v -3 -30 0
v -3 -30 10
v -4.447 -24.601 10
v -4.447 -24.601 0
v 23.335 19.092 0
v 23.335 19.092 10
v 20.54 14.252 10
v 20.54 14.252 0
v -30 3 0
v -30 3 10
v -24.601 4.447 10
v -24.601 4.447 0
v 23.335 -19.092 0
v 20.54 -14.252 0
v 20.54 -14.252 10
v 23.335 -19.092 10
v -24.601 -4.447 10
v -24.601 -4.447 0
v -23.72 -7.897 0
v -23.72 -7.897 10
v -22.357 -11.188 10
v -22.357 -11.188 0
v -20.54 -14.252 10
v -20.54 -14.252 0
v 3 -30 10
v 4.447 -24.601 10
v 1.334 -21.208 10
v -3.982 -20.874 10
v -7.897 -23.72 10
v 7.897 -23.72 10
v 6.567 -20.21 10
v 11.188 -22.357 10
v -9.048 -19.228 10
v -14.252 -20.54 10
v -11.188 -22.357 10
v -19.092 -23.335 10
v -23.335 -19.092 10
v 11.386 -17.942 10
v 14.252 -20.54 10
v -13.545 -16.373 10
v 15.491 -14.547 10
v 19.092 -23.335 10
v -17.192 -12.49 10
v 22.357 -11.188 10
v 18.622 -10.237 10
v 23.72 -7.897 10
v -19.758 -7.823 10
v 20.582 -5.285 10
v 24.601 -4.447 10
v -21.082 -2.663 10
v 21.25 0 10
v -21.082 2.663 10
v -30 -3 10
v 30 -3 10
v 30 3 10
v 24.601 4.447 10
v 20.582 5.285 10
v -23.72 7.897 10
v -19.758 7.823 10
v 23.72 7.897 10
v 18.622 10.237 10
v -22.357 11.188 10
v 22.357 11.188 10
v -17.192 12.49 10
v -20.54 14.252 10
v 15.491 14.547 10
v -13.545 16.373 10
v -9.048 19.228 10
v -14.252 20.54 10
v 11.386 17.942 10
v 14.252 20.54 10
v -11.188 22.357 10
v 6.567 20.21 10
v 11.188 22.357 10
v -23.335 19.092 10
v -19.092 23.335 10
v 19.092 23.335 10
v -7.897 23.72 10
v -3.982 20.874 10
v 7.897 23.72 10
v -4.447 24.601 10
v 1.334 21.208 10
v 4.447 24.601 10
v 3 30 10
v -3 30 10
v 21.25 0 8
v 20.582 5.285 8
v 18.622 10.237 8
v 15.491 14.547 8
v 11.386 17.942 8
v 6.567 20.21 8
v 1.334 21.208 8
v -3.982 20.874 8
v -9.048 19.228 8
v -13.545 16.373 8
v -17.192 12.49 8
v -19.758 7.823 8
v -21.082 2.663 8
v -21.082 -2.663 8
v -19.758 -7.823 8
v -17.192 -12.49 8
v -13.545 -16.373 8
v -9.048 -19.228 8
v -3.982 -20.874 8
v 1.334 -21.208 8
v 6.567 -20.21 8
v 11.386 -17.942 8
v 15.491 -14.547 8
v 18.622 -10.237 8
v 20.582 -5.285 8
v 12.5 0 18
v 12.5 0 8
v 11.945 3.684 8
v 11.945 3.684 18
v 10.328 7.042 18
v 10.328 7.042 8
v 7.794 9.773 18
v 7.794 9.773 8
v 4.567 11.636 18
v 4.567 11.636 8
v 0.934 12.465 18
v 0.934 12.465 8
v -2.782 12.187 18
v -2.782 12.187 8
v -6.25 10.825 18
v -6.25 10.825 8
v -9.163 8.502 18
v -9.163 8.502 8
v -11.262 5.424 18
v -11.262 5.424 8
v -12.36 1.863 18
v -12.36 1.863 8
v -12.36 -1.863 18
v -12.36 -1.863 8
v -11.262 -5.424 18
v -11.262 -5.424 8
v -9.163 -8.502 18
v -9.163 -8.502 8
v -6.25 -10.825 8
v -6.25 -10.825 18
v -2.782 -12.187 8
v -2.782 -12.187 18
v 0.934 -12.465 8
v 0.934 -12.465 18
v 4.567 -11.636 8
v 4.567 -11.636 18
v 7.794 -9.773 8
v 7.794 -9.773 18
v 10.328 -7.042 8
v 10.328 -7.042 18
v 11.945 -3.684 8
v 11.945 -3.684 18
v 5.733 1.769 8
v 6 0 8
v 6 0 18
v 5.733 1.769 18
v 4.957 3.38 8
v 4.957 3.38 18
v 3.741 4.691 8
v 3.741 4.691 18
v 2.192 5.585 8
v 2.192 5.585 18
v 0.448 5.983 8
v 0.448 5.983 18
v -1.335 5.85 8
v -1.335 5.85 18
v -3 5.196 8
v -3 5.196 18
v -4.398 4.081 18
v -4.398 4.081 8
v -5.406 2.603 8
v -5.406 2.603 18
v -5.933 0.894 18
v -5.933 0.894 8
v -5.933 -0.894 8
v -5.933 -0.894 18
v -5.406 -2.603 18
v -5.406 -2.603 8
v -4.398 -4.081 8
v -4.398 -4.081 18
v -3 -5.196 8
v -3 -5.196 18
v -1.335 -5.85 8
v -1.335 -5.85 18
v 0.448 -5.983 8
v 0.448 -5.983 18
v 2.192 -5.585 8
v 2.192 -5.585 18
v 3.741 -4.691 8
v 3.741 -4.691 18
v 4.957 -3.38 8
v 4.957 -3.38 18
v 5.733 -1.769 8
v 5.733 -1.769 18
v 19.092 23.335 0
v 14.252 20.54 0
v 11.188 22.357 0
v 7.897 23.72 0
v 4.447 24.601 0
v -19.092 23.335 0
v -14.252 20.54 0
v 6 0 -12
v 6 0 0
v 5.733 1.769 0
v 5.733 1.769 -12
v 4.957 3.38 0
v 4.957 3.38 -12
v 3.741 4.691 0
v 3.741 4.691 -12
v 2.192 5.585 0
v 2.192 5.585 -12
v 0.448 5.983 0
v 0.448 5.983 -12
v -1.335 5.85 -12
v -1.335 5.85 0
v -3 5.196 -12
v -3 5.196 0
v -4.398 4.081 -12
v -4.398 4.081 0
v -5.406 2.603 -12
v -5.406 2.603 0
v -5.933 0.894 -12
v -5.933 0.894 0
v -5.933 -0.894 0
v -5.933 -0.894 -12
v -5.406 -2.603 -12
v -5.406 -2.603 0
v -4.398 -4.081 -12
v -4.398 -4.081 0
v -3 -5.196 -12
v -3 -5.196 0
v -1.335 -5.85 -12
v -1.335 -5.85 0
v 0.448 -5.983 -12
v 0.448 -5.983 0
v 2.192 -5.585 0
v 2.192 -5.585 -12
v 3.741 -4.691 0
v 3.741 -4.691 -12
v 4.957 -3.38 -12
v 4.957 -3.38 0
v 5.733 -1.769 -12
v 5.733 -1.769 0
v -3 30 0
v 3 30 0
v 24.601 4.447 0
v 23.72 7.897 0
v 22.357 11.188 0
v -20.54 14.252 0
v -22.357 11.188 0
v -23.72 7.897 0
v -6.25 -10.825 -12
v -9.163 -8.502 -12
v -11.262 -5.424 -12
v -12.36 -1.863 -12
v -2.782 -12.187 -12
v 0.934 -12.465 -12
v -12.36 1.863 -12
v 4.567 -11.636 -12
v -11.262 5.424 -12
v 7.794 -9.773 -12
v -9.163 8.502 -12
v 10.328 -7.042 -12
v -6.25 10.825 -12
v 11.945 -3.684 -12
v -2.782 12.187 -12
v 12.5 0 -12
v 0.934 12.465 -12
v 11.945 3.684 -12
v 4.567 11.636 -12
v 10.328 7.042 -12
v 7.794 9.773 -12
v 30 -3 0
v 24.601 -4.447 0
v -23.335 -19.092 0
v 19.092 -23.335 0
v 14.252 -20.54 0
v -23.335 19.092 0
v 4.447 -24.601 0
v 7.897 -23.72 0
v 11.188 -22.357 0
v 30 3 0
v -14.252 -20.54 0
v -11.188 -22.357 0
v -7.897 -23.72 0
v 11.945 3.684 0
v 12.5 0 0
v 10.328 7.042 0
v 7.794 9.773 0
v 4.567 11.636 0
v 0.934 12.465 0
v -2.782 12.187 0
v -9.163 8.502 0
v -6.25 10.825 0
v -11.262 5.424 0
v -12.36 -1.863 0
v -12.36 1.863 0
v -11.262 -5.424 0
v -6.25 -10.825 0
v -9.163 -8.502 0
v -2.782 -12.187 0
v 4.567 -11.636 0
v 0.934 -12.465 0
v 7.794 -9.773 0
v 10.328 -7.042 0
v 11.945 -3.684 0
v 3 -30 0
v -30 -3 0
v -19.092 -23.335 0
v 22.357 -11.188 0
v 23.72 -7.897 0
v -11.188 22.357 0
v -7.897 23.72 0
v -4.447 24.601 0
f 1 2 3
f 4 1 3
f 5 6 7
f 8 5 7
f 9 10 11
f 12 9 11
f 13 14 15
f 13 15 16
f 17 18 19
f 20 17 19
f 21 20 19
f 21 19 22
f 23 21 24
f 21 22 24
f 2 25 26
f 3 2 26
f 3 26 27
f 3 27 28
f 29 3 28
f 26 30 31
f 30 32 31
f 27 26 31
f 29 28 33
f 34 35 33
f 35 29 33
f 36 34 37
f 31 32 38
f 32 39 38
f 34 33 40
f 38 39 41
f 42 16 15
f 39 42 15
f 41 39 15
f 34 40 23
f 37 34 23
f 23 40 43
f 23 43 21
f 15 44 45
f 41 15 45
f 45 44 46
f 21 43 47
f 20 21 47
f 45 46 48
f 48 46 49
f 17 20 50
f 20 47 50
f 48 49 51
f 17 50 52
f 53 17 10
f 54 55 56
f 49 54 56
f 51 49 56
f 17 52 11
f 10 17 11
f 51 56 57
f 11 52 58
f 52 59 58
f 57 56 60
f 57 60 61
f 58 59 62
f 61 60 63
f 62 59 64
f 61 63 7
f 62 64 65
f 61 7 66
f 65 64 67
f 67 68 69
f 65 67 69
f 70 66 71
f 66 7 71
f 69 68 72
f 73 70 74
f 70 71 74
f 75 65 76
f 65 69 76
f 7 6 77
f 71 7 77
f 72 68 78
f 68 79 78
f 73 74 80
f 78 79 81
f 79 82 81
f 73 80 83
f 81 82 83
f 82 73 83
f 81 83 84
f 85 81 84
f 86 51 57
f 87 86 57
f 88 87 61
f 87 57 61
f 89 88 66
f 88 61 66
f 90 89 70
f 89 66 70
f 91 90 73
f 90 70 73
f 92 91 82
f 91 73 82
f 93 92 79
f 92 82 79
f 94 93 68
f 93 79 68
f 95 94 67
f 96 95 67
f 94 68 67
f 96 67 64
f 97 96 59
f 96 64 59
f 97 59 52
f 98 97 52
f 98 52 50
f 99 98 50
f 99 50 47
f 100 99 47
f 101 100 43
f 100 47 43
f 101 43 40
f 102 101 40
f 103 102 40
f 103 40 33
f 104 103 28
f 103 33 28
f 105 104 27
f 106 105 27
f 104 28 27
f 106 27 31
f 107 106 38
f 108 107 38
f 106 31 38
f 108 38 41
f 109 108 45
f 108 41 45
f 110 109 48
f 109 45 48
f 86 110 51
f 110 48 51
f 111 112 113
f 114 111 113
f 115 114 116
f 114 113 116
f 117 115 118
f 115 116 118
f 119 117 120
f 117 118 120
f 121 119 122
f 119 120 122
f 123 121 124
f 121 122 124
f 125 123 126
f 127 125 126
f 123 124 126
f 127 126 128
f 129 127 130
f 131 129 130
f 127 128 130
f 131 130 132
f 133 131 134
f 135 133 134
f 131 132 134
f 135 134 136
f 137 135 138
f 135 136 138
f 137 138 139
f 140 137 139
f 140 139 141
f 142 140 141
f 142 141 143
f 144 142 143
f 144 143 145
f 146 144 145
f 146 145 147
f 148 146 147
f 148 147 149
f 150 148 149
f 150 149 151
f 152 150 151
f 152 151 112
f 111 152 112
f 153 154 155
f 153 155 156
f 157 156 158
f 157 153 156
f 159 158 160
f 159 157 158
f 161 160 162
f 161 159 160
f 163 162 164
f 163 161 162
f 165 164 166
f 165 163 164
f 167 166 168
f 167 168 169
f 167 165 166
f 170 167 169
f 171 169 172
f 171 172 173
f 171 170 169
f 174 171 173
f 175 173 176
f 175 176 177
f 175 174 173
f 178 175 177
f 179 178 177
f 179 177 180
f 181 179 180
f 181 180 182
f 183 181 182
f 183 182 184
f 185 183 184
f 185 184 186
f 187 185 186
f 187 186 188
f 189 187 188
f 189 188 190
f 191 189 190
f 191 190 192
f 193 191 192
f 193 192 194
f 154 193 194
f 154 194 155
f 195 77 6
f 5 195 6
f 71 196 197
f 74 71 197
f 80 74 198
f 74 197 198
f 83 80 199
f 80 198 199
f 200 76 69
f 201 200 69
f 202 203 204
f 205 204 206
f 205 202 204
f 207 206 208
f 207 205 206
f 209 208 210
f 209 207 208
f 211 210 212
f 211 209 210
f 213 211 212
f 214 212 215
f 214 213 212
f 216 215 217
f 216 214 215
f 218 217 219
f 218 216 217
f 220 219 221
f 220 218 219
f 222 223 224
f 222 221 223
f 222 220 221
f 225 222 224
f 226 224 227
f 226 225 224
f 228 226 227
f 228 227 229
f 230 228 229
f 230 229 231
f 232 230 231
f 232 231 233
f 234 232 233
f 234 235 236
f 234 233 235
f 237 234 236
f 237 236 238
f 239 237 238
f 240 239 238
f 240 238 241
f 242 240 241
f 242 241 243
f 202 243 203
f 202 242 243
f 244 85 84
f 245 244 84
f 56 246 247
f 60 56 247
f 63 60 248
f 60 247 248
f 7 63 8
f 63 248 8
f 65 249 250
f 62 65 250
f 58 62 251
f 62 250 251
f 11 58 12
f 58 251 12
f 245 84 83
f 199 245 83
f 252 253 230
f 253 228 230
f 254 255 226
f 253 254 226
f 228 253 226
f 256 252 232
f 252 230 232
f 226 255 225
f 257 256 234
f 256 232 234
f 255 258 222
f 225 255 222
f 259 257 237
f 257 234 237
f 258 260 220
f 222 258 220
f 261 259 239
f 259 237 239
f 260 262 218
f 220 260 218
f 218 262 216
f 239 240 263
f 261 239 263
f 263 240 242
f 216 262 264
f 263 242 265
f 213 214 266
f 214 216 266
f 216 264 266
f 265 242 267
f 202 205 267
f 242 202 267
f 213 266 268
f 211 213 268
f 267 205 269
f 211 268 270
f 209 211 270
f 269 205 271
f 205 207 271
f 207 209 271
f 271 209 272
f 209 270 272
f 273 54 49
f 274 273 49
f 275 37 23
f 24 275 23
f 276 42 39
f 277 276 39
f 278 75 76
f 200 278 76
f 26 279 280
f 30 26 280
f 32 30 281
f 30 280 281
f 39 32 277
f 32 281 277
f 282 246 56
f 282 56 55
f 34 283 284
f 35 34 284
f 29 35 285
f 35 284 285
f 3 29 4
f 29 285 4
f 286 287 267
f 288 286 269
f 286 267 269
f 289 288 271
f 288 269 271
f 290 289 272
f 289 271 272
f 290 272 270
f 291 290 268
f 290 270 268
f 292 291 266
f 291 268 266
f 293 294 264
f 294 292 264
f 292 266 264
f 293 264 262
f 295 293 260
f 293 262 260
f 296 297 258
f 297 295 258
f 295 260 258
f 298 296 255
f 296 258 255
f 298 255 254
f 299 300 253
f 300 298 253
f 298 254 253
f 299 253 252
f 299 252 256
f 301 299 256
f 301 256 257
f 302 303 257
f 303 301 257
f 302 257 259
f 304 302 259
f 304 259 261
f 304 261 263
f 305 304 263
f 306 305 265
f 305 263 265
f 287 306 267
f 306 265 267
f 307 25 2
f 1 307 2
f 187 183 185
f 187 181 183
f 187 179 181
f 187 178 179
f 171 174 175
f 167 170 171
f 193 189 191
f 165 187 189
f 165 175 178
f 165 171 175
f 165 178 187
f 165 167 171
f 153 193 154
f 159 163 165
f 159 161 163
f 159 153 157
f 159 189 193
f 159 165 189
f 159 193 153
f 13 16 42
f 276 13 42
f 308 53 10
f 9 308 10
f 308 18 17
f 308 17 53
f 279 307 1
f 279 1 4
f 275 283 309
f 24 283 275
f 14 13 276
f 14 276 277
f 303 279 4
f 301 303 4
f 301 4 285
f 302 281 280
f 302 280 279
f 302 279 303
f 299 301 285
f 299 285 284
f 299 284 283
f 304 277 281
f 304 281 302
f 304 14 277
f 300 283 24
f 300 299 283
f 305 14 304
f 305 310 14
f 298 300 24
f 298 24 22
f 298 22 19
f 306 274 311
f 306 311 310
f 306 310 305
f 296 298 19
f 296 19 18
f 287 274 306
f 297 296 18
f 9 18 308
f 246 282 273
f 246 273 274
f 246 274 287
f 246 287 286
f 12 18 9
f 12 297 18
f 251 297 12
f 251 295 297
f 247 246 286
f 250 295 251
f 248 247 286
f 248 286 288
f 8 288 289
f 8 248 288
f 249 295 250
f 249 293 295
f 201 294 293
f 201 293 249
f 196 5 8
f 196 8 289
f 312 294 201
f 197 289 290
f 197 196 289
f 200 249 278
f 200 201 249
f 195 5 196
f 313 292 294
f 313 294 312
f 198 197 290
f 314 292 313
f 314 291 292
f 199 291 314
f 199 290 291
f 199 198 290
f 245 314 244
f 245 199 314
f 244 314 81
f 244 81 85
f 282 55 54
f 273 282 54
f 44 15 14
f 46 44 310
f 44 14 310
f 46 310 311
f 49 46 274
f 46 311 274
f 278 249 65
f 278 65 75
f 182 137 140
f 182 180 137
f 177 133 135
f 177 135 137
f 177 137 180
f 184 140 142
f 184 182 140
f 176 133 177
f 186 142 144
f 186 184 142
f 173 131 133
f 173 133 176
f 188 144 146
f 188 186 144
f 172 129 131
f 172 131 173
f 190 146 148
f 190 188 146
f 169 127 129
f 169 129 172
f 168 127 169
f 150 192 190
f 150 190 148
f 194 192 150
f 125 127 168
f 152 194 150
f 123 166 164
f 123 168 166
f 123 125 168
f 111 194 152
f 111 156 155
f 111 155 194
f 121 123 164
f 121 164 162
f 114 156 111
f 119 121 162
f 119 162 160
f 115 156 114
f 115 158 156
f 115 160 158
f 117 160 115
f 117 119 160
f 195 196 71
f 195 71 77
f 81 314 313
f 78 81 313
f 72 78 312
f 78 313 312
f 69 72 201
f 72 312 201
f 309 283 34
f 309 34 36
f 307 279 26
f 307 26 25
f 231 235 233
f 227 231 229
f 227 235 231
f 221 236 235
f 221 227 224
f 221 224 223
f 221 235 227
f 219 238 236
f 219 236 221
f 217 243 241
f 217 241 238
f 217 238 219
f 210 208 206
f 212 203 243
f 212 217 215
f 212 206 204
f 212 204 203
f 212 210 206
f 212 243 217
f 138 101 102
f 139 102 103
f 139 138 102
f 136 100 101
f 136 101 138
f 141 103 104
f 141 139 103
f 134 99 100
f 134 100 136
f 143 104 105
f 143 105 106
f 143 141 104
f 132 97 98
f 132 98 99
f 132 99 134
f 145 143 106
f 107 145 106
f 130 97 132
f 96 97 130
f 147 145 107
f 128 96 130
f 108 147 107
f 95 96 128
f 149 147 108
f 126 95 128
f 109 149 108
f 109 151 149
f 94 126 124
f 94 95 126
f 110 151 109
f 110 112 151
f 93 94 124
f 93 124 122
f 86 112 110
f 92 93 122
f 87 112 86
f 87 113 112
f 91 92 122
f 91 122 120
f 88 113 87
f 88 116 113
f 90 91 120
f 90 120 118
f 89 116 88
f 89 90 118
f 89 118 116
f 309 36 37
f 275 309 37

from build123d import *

# Parameters (mm, degrees)
SKETCH1_R           = 25
EXTRUDE1_DEPTH      = 10
EXTRUDE2_DEPTH      = 10
CIRPATTERN1_COUNT   = 8
SKETCH3_R           = 21.25
CUT_EXTRUDE1_DEPTH  = 2
EXTRUDE3_DEPTH      = 10
EXTRUDE3_DEPTH_BACK = 20
SKETCH4_R           = 12.5
SKETCH4_R_2         = 6


with BuildPart() as part:
    # Sketch1 → Extrude1 (new body)
    with BuildSketch(Plane.XY):
        Circle(SKETCH1_R)
    extrude(amount=EXTRUDE1_DEPTH)

    # Sketch2 → Extrude2 (add)
    with BuildSketch(Plane.XY.offset(10)):
        Polygon((-3, 30), (3, 30), (5.679491924, 20), (-5.679491924, 20), align=None)
    extrude2 = extrude(amount=-EXTRUDE2_DEPTH)

    # CirPattern1: Extrude2 ×8 about axis
    cirpattern1_axis = Axis((0, 0, 0), (0, 0, 1))
    for i in range(1, CIRPATTERN1_COUNT):
        add(extrude2.rotate(cirpattern1_axis, i * 360 / CIRPATTERN1_COUNT))

    # Sketch3 → Cut-Extrude1 (cut)
    with BuildSketch(Plane.XY.offset(10)):
        Circle(SKETCH3_R)
    extrude(amount=-CUT_EXTRUDE1_DEPTH, mode=Mode.SUBTRACT)

    # Sketch4 → Extrude3 (add, two sides: drawn at the far end of the back side and taken through both)
    with BuildSketch(Plane.XY.offset(8).offset(-EXTRUDE3_DEPTH_BACK)):
        Circle(SKETCH4_R)
        Circle(SKETCH4_R_2, mode=Mode.SUBTRACT)
    extrude(amount=EXTRUDE3_DEPTH + EXTRUDE3_DEPTH_BACK)


solid = part.part
